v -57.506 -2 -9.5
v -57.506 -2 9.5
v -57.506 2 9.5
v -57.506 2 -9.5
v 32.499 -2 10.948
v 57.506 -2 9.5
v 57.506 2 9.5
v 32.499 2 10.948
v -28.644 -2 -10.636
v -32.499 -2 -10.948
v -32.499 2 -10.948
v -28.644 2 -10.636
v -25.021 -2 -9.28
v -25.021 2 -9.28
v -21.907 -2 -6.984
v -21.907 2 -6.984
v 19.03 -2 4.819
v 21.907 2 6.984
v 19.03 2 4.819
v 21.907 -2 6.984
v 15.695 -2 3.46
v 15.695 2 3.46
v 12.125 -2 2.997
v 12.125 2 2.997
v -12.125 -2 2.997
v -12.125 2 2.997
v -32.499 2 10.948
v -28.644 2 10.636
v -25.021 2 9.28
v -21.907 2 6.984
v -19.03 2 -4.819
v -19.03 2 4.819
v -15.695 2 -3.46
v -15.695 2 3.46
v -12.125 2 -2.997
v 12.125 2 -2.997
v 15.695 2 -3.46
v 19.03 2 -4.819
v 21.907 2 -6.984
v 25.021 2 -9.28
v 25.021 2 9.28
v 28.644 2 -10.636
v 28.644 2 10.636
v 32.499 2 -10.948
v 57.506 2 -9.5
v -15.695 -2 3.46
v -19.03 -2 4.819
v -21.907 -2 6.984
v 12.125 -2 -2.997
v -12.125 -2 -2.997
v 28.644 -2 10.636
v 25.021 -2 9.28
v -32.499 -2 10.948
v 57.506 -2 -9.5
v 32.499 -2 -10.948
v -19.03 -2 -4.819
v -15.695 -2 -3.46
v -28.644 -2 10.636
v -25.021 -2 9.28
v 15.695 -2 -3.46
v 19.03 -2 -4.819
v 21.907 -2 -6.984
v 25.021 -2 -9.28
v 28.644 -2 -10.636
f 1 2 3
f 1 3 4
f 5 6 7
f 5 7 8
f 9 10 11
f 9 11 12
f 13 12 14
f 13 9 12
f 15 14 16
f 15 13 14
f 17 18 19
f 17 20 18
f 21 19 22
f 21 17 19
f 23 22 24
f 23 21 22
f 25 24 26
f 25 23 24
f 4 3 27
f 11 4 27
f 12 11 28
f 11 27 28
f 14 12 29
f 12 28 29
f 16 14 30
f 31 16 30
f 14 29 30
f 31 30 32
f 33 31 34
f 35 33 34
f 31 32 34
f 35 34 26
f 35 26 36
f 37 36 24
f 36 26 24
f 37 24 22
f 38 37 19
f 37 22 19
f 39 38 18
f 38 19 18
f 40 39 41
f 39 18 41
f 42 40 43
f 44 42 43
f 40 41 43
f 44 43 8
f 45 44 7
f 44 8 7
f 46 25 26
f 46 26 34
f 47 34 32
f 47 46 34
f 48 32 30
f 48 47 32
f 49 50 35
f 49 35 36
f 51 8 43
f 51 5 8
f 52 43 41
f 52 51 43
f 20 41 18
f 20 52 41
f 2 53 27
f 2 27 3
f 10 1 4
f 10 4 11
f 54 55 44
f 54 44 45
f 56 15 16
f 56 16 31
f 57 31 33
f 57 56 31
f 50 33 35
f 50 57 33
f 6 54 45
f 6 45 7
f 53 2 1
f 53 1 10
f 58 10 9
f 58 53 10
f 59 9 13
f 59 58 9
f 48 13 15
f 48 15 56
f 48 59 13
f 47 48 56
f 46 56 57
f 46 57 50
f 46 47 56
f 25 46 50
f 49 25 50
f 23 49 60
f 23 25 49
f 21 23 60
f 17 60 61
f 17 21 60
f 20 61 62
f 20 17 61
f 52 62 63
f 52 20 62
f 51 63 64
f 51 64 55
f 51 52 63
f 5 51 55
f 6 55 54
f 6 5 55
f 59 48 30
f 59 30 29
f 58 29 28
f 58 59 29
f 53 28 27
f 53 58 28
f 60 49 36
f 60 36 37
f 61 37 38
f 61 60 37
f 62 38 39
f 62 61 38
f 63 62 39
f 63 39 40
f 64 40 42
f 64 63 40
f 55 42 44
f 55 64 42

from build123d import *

# Parameters (mm, degrees)
F1_DEPTH = 2


with BuildPart() as f1:
    # F0 (on Front) → F1 (new body, symmetric)
    with BuildSketch(Plane.XZ):
        with BuildLine():
            Line((12.124539, 2.9972), (0, 2.9972))
            Line((0, 2.9972), (-12.124539, 2.9972))
            ThreePointArc((-12.124539, 2.9972), (-17.406568, 4.032223), (-21.907339, 6.984201))
            ThreePointArc((-21.907339, 6.984201), (-26.785135, 10.083517), (-32.4993, 10.947792))
            Line((-32.4993, 10.947792), (-57.5056, 9.4996))
            Line((-57.5056, 9.4996), (-57.5056, 0))
            Line((-57.5056, 0), (-57.5056, -9.4996))
            Line((-57.5056, -9.4996), (-32.4993, -10.947792))
            ThreePointArc((-32.4993, -10.947792), (-26.785135, -10.083517), (-21.907339, -6.984201))
            ThreePointArc((-21.907339, -6.984201), (-17.406568, -4.032223), (-12.124539, -2.9972))
            Line((-12.124539, -2.9972), (0, -2.9972))
            Line((0, -2.9972), (12.124539, -2.9972))
            ThreePointArc((12.124539, -2.9972), (17.406568, -4.032223), (21.907339, -6.984201))
            ThreePointArc((21.907339, -6.984201), (26.785135, -10.083517), (32.4993, -10.947792))
            Line((32.4993, -10.947792), (57.5056, -9.4996))
            Line((57.5056, -9.4996), (57.5056, 0))
            Line((57.5056, 0), (57.5056, 9.4996))
            Line((57.5056, 9.4996), (32.4993, 10.947792))
            ThreePointArc((32.4993, 10.947792), (26.785135, 10.083517), (21.907339, 6.984201))
            ThreePointArc((21.907339, 6.984201), (17.406568, 4.032223), (12.124539, 2.9972))
        make_face()
    extrude(amount=F1_DEPTH, both=True)


solid = f1.part
